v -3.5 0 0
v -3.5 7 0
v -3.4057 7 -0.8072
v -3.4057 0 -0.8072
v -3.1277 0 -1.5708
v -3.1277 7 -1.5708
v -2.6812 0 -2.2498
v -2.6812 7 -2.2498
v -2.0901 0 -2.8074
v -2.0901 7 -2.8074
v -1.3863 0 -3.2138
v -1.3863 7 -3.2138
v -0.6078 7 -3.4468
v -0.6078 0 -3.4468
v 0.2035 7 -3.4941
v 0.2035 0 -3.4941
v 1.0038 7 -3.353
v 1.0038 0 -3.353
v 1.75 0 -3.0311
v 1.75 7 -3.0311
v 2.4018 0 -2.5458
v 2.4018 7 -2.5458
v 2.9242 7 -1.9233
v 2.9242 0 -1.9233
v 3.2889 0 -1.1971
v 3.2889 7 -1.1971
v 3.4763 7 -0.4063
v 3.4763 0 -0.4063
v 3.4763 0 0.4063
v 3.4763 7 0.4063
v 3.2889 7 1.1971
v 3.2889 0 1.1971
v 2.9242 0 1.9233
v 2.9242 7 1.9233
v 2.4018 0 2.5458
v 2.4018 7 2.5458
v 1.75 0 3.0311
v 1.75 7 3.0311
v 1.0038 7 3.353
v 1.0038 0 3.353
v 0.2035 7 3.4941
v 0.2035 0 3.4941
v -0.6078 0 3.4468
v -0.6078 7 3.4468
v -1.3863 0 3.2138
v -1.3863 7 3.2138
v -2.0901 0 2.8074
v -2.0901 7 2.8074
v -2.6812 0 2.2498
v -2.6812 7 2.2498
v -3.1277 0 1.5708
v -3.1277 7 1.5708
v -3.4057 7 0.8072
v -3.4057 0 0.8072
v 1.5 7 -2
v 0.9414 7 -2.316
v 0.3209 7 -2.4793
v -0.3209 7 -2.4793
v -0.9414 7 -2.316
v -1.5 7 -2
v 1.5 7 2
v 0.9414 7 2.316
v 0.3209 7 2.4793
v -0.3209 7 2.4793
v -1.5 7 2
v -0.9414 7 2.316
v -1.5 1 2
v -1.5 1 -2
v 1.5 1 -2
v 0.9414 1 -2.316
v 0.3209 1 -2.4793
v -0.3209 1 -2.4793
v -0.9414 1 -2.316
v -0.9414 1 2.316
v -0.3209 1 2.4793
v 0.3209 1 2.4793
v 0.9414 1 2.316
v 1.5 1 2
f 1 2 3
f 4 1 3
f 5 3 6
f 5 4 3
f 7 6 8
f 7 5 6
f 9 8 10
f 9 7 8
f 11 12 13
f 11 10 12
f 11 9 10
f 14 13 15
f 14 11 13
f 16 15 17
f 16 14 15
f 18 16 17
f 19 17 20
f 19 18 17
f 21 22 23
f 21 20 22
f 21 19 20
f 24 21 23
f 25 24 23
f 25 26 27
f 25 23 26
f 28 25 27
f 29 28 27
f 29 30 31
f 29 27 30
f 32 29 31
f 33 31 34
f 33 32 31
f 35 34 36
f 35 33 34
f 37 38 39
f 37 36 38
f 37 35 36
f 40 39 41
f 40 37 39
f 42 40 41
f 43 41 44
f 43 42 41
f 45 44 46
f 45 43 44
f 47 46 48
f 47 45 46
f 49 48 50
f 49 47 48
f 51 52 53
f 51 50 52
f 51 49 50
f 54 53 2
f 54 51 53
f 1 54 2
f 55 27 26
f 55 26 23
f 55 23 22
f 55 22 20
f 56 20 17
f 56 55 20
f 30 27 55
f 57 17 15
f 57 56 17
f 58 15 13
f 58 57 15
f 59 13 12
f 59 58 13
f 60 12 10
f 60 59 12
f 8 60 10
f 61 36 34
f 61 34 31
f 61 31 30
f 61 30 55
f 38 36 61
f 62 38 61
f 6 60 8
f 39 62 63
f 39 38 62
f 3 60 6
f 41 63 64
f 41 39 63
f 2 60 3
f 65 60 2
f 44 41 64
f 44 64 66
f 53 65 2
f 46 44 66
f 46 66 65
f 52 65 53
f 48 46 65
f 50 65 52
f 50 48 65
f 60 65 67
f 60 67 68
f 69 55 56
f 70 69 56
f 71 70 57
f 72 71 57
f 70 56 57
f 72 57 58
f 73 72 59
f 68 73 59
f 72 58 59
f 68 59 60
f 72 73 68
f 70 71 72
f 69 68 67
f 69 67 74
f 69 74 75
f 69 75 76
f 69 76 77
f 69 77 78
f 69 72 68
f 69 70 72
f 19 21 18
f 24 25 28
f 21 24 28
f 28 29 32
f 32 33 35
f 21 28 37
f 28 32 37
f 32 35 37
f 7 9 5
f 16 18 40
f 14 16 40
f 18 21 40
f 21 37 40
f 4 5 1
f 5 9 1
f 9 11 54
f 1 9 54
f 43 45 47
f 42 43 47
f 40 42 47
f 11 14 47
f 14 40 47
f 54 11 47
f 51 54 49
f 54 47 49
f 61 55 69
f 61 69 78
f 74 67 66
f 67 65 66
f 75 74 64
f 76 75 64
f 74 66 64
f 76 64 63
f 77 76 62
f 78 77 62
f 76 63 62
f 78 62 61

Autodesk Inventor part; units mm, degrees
ref_plane "YZ Plane" through (0, 0, 0) normal (1, 0, 0) x (0, 1, 0)
ref_plane "XZ Plane" through (0, 0, 0) normal (0, 1, 0) x (-1, 0, 0)
ref_plane "XY Plane" through (0, 0, 0) normal (0, 0, 1) x (1, 0, 0)
sketch "Sketch1" plane through (0, 0, 0) normal (0, 1, 0) x (-1, 0, 0)
  circle A0 centre (0, 0) radius 3.5
  dimension "d0" = 7
extrude "Extrusion1" add sketch "Sketch1" along normal blind 7
sketch "Sketch2" plane through (0, 7, 0) normal (0, 1, 0) x (1, 0, 0)
  circle A0 centre (0, 0) radius 2.5
  line L0 (1.5, -2.75) -> (-1.5, -2.75)
  line L1 (-1.5, -2.75) -> (-1.5, 2.75)
  line L2 (-1.5, 2.75) -> (1.5, 2.75)
  line L3 (1.5, 2.75) -> (1.5, -2.75)
  line L4 (1.5, -2.75) -> (-1.5, 2.75) construction
  line L5 (-1.5, -2.75) -> (1.5, 2.75) construction
  point P0 (1.5, -2)
  point P1 (1.5, 2)
  point P2 (-1.5, 2)
  point P3 (-1.5, -2)
  dimension "d3" = 5
  dimension "d4" = 3
  dimension "d5" = 5.5
extrude "Extrusion2" cut sketch "Sketch2" against normal blind 6 contours L3 A0 L1
properties part number "ozubeneKoleckoStepper"
